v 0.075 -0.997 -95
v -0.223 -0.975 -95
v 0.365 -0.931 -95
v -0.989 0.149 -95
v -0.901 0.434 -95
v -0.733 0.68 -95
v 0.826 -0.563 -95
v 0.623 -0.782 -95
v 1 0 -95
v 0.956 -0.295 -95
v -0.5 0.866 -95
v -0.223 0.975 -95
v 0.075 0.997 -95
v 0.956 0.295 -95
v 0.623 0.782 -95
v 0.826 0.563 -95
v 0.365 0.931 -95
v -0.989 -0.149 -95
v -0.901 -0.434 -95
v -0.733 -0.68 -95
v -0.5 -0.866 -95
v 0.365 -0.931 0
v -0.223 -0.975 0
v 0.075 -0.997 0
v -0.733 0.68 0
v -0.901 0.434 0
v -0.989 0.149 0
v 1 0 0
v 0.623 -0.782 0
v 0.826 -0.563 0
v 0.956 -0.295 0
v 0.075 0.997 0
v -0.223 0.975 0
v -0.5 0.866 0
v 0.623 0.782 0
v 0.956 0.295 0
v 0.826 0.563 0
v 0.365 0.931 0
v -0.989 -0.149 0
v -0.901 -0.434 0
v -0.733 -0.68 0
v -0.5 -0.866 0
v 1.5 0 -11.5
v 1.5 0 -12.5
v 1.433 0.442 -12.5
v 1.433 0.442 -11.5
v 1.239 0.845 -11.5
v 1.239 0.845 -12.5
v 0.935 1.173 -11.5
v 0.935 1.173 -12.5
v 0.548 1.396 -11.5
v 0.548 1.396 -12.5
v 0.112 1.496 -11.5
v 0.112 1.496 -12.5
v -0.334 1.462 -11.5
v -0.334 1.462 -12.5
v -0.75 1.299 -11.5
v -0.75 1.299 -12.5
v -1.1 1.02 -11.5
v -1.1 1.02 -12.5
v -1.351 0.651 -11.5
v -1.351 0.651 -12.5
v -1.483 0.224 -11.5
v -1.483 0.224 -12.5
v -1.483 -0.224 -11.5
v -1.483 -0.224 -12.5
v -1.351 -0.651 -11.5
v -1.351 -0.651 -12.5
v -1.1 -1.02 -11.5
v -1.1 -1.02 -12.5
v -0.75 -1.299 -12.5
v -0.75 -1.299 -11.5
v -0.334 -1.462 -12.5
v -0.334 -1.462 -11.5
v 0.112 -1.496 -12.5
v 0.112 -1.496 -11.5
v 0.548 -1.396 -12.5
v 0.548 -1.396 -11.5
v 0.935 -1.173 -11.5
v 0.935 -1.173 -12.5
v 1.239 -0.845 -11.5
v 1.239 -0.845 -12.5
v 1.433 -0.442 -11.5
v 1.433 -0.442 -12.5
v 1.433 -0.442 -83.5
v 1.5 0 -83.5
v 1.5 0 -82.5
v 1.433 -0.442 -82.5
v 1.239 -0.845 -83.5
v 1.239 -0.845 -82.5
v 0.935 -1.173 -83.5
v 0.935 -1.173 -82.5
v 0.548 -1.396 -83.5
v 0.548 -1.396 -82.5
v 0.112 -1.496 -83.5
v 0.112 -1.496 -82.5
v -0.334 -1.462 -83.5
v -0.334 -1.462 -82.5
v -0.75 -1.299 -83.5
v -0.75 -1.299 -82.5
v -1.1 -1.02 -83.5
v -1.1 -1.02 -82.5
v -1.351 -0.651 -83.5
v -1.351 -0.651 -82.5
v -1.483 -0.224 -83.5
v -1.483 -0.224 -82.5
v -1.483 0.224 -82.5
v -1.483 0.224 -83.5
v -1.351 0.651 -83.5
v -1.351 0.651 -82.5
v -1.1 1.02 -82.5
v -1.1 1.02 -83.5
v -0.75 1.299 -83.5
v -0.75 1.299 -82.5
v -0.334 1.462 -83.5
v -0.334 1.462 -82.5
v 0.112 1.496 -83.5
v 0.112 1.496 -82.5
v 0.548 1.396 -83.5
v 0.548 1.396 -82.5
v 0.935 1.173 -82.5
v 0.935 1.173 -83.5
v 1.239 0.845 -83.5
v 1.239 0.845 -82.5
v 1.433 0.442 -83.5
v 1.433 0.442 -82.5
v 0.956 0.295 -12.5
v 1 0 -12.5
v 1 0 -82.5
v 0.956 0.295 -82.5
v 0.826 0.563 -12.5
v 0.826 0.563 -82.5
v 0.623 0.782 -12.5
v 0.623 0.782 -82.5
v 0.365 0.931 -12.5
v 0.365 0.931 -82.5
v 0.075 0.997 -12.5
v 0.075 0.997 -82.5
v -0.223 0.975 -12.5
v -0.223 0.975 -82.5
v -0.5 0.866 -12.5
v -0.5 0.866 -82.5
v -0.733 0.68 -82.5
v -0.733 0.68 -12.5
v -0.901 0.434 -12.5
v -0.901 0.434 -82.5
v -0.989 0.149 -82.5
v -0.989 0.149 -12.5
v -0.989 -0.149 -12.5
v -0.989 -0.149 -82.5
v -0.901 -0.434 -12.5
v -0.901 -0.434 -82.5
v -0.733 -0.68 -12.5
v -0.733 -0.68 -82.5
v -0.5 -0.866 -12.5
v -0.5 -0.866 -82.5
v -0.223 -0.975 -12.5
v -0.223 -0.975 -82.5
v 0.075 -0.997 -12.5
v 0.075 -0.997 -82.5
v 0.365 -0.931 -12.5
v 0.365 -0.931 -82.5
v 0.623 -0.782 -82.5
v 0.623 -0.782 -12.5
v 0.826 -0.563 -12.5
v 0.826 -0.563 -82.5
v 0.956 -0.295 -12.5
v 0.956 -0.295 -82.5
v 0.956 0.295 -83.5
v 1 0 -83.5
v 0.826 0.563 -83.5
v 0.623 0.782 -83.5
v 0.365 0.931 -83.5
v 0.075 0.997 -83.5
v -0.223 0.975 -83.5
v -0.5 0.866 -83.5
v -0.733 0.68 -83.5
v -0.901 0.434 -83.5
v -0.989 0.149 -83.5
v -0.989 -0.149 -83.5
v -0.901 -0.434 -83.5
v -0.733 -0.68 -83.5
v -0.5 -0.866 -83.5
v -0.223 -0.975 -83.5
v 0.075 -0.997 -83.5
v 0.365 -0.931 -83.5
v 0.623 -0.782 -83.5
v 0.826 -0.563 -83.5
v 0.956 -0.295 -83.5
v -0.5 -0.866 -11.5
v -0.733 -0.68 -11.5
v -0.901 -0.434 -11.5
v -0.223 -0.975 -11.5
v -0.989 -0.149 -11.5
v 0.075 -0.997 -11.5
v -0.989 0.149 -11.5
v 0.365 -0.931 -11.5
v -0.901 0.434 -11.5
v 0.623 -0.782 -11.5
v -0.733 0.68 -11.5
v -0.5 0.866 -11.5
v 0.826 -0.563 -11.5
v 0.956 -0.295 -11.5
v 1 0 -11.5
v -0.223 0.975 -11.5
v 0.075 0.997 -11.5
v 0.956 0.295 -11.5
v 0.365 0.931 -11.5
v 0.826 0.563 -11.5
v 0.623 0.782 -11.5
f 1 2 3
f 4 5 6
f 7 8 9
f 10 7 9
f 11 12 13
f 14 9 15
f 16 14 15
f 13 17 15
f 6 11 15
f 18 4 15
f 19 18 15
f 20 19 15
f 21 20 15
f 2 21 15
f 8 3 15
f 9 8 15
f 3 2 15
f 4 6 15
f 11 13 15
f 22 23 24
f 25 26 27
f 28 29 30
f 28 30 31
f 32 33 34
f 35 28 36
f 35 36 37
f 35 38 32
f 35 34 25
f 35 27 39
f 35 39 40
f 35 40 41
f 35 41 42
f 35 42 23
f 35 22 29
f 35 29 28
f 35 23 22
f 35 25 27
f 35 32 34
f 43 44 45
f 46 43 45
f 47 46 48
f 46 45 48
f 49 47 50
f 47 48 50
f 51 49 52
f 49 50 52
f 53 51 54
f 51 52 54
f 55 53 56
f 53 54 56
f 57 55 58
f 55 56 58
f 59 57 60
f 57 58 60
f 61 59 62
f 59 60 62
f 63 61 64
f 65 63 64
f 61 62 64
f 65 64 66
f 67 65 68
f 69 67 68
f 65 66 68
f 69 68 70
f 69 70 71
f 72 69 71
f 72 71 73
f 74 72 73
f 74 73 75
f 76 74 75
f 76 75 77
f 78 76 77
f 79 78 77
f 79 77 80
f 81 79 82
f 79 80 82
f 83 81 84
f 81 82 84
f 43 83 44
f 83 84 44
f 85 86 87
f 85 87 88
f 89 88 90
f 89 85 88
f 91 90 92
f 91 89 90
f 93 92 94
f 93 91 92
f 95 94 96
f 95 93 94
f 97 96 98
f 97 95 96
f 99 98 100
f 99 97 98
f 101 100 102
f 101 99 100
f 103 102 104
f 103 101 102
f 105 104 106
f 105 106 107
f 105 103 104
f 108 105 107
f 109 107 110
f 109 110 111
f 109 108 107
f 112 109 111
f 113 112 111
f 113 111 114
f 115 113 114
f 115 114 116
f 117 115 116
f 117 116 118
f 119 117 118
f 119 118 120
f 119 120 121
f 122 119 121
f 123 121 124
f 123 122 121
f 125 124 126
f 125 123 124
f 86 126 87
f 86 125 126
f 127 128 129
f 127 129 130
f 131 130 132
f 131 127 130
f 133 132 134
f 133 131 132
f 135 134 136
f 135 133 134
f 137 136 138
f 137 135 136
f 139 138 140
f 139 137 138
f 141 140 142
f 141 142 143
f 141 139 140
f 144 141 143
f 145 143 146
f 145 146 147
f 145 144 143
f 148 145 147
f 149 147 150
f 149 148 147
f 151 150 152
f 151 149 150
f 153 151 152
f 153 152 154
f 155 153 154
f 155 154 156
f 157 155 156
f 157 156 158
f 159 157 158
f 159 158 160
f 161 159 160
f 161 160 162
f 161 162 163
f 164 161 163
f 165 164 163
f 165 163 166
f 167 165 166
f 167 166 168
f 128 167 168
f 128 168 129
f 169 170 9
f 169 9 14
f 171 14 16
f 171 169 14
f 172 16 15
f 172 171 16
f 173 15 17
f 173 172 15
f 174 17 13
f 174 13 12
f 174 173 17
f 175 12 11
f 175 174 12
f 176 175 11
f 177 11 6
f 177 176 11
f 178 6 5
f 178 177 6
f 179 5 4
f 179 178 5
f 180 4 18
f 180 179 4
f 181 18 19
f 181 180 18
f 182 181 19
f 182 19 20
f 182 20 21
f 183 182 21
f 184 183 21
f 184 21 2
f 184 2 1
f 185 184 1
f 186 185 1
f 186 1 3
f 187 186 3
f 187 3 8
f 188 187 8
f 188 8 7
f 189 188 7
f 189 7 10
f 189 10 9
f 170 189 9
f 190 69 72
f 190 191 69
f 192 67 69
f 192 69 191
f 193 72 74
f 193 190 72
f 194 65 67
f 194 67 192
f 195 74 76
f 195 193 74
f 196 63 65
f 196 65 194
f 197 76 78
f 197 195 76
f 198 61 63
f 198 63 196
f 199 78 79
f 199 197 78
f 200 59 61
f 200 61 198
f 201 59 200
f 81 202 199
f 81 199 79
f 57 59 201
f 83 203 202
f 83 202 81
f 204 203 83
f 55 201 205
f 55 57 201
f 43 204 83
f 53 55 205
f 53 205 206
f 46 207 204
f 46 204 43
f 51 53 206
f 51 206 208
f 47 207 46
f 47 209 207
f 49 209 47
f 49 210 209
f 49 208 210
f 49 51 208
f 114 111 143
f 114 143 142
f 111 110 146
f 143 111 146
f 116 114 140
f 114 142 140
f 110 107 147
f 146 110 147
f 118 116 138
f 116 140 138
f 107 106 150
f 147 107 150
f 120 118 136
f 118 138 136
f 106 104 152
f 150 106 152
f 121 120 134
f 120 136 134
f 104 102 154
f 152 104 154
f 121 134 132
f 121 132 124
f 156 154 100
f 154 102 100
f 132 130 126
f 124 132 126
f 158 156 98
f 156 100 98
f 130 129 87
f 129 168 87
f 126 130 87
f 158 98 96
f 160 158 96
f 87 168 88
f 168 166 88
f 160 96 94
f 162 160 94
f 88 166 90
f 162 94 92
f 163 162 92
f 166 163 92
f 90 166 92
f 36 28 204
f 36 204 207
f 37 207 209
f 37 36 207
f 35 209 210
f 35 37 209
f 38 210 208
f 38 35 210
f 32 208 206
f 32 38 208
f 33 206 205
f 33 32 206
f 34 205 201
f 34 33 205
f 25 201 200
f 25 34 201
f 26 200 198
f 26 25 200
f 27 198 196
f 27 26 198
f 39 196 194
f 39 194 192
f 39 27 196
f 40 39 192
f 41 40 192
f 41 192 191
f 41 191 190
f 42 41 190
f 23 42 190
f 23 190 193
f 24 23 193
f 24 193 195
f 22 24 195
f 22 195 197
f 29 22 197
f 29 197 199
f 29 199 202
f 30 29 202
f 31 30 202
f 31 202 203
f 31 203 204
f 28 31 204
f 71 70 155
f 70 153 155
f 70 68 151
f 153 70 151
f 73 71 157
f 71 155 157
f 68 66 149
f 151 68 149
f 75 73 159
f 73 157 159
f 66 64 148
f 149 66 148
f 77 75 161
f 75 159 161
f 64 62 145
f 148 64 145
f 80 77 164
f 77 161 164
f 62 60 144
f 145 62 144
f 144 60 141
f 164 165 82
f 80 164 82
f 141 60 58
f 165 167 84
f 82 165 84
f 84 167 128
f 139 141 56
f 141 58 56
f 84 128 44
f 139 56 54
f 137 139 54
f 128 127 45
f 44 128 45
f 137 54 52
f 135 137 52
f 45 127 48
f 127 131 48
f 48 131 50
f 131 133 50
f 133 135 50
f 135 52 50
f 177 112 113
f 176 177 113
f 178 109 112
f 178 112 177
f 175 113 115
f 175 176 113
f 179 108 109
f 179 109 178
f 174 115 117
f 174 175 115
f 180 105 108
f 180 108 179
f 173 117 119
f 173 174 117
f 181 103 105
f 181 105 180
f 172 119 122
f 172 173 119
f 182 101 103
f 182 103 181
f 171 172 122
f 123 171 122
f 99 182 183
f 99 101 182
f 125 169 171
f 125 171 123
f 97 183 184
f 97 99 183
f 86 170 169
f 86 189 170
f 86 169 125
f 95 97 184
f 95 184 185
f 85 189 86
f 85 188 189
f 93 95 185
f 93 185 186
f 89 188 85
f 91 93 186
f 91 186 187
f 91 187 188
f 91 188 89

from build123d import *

# Parameters (mm, degrees)
SKETCH2_R           = 1
BOSS_EXTRUDE1_DEPTH = 95
BOSS_EXTRUDE2_START = -12.5
SKETCH3_R           = 1.5
BOSS_EXTRUDE2_DEPTH = 1
BOSS_EXTRUDE3_START = -11.5
SKETCH4_R           = 1.5
BOSS_EXTRUDE3_DEPTH = 1


with BuildPart() as part:
    # Sketch2 → Boss-Extrude1 (new body)
    with BuildSketch(Plane.XY):
        Circle(SKETCH2_R)
    extrude(amount=-BOSS_EXTRUDE1_DEPTH)

    # Sketch3 → Boss-Extrude2 (add)
    with BuildSketch(Plane.XY.offset(BOSS_EXTRUDE2_START)):
        Circle(SKETCH3_R)
    extrude(amount=BOSS_EXTRUDE2_DEPTH)

    # Sketch4 → Boss-Extrude3 (add)
    with BuildSketch(Plane(origin=(0, 0, -95), x_dir=(-1, 0, 0), z_dir=(0, 0, -1)).offset(BOSS_EXTRUDE3_START)):
        with Locations(Location((0, 0, 0), (0, 0, 180))):
            Circle(SKETCH4_R)
    extrude(amount=-BOSS_EXTRUDE3_DEPTH)


solid = part.part
